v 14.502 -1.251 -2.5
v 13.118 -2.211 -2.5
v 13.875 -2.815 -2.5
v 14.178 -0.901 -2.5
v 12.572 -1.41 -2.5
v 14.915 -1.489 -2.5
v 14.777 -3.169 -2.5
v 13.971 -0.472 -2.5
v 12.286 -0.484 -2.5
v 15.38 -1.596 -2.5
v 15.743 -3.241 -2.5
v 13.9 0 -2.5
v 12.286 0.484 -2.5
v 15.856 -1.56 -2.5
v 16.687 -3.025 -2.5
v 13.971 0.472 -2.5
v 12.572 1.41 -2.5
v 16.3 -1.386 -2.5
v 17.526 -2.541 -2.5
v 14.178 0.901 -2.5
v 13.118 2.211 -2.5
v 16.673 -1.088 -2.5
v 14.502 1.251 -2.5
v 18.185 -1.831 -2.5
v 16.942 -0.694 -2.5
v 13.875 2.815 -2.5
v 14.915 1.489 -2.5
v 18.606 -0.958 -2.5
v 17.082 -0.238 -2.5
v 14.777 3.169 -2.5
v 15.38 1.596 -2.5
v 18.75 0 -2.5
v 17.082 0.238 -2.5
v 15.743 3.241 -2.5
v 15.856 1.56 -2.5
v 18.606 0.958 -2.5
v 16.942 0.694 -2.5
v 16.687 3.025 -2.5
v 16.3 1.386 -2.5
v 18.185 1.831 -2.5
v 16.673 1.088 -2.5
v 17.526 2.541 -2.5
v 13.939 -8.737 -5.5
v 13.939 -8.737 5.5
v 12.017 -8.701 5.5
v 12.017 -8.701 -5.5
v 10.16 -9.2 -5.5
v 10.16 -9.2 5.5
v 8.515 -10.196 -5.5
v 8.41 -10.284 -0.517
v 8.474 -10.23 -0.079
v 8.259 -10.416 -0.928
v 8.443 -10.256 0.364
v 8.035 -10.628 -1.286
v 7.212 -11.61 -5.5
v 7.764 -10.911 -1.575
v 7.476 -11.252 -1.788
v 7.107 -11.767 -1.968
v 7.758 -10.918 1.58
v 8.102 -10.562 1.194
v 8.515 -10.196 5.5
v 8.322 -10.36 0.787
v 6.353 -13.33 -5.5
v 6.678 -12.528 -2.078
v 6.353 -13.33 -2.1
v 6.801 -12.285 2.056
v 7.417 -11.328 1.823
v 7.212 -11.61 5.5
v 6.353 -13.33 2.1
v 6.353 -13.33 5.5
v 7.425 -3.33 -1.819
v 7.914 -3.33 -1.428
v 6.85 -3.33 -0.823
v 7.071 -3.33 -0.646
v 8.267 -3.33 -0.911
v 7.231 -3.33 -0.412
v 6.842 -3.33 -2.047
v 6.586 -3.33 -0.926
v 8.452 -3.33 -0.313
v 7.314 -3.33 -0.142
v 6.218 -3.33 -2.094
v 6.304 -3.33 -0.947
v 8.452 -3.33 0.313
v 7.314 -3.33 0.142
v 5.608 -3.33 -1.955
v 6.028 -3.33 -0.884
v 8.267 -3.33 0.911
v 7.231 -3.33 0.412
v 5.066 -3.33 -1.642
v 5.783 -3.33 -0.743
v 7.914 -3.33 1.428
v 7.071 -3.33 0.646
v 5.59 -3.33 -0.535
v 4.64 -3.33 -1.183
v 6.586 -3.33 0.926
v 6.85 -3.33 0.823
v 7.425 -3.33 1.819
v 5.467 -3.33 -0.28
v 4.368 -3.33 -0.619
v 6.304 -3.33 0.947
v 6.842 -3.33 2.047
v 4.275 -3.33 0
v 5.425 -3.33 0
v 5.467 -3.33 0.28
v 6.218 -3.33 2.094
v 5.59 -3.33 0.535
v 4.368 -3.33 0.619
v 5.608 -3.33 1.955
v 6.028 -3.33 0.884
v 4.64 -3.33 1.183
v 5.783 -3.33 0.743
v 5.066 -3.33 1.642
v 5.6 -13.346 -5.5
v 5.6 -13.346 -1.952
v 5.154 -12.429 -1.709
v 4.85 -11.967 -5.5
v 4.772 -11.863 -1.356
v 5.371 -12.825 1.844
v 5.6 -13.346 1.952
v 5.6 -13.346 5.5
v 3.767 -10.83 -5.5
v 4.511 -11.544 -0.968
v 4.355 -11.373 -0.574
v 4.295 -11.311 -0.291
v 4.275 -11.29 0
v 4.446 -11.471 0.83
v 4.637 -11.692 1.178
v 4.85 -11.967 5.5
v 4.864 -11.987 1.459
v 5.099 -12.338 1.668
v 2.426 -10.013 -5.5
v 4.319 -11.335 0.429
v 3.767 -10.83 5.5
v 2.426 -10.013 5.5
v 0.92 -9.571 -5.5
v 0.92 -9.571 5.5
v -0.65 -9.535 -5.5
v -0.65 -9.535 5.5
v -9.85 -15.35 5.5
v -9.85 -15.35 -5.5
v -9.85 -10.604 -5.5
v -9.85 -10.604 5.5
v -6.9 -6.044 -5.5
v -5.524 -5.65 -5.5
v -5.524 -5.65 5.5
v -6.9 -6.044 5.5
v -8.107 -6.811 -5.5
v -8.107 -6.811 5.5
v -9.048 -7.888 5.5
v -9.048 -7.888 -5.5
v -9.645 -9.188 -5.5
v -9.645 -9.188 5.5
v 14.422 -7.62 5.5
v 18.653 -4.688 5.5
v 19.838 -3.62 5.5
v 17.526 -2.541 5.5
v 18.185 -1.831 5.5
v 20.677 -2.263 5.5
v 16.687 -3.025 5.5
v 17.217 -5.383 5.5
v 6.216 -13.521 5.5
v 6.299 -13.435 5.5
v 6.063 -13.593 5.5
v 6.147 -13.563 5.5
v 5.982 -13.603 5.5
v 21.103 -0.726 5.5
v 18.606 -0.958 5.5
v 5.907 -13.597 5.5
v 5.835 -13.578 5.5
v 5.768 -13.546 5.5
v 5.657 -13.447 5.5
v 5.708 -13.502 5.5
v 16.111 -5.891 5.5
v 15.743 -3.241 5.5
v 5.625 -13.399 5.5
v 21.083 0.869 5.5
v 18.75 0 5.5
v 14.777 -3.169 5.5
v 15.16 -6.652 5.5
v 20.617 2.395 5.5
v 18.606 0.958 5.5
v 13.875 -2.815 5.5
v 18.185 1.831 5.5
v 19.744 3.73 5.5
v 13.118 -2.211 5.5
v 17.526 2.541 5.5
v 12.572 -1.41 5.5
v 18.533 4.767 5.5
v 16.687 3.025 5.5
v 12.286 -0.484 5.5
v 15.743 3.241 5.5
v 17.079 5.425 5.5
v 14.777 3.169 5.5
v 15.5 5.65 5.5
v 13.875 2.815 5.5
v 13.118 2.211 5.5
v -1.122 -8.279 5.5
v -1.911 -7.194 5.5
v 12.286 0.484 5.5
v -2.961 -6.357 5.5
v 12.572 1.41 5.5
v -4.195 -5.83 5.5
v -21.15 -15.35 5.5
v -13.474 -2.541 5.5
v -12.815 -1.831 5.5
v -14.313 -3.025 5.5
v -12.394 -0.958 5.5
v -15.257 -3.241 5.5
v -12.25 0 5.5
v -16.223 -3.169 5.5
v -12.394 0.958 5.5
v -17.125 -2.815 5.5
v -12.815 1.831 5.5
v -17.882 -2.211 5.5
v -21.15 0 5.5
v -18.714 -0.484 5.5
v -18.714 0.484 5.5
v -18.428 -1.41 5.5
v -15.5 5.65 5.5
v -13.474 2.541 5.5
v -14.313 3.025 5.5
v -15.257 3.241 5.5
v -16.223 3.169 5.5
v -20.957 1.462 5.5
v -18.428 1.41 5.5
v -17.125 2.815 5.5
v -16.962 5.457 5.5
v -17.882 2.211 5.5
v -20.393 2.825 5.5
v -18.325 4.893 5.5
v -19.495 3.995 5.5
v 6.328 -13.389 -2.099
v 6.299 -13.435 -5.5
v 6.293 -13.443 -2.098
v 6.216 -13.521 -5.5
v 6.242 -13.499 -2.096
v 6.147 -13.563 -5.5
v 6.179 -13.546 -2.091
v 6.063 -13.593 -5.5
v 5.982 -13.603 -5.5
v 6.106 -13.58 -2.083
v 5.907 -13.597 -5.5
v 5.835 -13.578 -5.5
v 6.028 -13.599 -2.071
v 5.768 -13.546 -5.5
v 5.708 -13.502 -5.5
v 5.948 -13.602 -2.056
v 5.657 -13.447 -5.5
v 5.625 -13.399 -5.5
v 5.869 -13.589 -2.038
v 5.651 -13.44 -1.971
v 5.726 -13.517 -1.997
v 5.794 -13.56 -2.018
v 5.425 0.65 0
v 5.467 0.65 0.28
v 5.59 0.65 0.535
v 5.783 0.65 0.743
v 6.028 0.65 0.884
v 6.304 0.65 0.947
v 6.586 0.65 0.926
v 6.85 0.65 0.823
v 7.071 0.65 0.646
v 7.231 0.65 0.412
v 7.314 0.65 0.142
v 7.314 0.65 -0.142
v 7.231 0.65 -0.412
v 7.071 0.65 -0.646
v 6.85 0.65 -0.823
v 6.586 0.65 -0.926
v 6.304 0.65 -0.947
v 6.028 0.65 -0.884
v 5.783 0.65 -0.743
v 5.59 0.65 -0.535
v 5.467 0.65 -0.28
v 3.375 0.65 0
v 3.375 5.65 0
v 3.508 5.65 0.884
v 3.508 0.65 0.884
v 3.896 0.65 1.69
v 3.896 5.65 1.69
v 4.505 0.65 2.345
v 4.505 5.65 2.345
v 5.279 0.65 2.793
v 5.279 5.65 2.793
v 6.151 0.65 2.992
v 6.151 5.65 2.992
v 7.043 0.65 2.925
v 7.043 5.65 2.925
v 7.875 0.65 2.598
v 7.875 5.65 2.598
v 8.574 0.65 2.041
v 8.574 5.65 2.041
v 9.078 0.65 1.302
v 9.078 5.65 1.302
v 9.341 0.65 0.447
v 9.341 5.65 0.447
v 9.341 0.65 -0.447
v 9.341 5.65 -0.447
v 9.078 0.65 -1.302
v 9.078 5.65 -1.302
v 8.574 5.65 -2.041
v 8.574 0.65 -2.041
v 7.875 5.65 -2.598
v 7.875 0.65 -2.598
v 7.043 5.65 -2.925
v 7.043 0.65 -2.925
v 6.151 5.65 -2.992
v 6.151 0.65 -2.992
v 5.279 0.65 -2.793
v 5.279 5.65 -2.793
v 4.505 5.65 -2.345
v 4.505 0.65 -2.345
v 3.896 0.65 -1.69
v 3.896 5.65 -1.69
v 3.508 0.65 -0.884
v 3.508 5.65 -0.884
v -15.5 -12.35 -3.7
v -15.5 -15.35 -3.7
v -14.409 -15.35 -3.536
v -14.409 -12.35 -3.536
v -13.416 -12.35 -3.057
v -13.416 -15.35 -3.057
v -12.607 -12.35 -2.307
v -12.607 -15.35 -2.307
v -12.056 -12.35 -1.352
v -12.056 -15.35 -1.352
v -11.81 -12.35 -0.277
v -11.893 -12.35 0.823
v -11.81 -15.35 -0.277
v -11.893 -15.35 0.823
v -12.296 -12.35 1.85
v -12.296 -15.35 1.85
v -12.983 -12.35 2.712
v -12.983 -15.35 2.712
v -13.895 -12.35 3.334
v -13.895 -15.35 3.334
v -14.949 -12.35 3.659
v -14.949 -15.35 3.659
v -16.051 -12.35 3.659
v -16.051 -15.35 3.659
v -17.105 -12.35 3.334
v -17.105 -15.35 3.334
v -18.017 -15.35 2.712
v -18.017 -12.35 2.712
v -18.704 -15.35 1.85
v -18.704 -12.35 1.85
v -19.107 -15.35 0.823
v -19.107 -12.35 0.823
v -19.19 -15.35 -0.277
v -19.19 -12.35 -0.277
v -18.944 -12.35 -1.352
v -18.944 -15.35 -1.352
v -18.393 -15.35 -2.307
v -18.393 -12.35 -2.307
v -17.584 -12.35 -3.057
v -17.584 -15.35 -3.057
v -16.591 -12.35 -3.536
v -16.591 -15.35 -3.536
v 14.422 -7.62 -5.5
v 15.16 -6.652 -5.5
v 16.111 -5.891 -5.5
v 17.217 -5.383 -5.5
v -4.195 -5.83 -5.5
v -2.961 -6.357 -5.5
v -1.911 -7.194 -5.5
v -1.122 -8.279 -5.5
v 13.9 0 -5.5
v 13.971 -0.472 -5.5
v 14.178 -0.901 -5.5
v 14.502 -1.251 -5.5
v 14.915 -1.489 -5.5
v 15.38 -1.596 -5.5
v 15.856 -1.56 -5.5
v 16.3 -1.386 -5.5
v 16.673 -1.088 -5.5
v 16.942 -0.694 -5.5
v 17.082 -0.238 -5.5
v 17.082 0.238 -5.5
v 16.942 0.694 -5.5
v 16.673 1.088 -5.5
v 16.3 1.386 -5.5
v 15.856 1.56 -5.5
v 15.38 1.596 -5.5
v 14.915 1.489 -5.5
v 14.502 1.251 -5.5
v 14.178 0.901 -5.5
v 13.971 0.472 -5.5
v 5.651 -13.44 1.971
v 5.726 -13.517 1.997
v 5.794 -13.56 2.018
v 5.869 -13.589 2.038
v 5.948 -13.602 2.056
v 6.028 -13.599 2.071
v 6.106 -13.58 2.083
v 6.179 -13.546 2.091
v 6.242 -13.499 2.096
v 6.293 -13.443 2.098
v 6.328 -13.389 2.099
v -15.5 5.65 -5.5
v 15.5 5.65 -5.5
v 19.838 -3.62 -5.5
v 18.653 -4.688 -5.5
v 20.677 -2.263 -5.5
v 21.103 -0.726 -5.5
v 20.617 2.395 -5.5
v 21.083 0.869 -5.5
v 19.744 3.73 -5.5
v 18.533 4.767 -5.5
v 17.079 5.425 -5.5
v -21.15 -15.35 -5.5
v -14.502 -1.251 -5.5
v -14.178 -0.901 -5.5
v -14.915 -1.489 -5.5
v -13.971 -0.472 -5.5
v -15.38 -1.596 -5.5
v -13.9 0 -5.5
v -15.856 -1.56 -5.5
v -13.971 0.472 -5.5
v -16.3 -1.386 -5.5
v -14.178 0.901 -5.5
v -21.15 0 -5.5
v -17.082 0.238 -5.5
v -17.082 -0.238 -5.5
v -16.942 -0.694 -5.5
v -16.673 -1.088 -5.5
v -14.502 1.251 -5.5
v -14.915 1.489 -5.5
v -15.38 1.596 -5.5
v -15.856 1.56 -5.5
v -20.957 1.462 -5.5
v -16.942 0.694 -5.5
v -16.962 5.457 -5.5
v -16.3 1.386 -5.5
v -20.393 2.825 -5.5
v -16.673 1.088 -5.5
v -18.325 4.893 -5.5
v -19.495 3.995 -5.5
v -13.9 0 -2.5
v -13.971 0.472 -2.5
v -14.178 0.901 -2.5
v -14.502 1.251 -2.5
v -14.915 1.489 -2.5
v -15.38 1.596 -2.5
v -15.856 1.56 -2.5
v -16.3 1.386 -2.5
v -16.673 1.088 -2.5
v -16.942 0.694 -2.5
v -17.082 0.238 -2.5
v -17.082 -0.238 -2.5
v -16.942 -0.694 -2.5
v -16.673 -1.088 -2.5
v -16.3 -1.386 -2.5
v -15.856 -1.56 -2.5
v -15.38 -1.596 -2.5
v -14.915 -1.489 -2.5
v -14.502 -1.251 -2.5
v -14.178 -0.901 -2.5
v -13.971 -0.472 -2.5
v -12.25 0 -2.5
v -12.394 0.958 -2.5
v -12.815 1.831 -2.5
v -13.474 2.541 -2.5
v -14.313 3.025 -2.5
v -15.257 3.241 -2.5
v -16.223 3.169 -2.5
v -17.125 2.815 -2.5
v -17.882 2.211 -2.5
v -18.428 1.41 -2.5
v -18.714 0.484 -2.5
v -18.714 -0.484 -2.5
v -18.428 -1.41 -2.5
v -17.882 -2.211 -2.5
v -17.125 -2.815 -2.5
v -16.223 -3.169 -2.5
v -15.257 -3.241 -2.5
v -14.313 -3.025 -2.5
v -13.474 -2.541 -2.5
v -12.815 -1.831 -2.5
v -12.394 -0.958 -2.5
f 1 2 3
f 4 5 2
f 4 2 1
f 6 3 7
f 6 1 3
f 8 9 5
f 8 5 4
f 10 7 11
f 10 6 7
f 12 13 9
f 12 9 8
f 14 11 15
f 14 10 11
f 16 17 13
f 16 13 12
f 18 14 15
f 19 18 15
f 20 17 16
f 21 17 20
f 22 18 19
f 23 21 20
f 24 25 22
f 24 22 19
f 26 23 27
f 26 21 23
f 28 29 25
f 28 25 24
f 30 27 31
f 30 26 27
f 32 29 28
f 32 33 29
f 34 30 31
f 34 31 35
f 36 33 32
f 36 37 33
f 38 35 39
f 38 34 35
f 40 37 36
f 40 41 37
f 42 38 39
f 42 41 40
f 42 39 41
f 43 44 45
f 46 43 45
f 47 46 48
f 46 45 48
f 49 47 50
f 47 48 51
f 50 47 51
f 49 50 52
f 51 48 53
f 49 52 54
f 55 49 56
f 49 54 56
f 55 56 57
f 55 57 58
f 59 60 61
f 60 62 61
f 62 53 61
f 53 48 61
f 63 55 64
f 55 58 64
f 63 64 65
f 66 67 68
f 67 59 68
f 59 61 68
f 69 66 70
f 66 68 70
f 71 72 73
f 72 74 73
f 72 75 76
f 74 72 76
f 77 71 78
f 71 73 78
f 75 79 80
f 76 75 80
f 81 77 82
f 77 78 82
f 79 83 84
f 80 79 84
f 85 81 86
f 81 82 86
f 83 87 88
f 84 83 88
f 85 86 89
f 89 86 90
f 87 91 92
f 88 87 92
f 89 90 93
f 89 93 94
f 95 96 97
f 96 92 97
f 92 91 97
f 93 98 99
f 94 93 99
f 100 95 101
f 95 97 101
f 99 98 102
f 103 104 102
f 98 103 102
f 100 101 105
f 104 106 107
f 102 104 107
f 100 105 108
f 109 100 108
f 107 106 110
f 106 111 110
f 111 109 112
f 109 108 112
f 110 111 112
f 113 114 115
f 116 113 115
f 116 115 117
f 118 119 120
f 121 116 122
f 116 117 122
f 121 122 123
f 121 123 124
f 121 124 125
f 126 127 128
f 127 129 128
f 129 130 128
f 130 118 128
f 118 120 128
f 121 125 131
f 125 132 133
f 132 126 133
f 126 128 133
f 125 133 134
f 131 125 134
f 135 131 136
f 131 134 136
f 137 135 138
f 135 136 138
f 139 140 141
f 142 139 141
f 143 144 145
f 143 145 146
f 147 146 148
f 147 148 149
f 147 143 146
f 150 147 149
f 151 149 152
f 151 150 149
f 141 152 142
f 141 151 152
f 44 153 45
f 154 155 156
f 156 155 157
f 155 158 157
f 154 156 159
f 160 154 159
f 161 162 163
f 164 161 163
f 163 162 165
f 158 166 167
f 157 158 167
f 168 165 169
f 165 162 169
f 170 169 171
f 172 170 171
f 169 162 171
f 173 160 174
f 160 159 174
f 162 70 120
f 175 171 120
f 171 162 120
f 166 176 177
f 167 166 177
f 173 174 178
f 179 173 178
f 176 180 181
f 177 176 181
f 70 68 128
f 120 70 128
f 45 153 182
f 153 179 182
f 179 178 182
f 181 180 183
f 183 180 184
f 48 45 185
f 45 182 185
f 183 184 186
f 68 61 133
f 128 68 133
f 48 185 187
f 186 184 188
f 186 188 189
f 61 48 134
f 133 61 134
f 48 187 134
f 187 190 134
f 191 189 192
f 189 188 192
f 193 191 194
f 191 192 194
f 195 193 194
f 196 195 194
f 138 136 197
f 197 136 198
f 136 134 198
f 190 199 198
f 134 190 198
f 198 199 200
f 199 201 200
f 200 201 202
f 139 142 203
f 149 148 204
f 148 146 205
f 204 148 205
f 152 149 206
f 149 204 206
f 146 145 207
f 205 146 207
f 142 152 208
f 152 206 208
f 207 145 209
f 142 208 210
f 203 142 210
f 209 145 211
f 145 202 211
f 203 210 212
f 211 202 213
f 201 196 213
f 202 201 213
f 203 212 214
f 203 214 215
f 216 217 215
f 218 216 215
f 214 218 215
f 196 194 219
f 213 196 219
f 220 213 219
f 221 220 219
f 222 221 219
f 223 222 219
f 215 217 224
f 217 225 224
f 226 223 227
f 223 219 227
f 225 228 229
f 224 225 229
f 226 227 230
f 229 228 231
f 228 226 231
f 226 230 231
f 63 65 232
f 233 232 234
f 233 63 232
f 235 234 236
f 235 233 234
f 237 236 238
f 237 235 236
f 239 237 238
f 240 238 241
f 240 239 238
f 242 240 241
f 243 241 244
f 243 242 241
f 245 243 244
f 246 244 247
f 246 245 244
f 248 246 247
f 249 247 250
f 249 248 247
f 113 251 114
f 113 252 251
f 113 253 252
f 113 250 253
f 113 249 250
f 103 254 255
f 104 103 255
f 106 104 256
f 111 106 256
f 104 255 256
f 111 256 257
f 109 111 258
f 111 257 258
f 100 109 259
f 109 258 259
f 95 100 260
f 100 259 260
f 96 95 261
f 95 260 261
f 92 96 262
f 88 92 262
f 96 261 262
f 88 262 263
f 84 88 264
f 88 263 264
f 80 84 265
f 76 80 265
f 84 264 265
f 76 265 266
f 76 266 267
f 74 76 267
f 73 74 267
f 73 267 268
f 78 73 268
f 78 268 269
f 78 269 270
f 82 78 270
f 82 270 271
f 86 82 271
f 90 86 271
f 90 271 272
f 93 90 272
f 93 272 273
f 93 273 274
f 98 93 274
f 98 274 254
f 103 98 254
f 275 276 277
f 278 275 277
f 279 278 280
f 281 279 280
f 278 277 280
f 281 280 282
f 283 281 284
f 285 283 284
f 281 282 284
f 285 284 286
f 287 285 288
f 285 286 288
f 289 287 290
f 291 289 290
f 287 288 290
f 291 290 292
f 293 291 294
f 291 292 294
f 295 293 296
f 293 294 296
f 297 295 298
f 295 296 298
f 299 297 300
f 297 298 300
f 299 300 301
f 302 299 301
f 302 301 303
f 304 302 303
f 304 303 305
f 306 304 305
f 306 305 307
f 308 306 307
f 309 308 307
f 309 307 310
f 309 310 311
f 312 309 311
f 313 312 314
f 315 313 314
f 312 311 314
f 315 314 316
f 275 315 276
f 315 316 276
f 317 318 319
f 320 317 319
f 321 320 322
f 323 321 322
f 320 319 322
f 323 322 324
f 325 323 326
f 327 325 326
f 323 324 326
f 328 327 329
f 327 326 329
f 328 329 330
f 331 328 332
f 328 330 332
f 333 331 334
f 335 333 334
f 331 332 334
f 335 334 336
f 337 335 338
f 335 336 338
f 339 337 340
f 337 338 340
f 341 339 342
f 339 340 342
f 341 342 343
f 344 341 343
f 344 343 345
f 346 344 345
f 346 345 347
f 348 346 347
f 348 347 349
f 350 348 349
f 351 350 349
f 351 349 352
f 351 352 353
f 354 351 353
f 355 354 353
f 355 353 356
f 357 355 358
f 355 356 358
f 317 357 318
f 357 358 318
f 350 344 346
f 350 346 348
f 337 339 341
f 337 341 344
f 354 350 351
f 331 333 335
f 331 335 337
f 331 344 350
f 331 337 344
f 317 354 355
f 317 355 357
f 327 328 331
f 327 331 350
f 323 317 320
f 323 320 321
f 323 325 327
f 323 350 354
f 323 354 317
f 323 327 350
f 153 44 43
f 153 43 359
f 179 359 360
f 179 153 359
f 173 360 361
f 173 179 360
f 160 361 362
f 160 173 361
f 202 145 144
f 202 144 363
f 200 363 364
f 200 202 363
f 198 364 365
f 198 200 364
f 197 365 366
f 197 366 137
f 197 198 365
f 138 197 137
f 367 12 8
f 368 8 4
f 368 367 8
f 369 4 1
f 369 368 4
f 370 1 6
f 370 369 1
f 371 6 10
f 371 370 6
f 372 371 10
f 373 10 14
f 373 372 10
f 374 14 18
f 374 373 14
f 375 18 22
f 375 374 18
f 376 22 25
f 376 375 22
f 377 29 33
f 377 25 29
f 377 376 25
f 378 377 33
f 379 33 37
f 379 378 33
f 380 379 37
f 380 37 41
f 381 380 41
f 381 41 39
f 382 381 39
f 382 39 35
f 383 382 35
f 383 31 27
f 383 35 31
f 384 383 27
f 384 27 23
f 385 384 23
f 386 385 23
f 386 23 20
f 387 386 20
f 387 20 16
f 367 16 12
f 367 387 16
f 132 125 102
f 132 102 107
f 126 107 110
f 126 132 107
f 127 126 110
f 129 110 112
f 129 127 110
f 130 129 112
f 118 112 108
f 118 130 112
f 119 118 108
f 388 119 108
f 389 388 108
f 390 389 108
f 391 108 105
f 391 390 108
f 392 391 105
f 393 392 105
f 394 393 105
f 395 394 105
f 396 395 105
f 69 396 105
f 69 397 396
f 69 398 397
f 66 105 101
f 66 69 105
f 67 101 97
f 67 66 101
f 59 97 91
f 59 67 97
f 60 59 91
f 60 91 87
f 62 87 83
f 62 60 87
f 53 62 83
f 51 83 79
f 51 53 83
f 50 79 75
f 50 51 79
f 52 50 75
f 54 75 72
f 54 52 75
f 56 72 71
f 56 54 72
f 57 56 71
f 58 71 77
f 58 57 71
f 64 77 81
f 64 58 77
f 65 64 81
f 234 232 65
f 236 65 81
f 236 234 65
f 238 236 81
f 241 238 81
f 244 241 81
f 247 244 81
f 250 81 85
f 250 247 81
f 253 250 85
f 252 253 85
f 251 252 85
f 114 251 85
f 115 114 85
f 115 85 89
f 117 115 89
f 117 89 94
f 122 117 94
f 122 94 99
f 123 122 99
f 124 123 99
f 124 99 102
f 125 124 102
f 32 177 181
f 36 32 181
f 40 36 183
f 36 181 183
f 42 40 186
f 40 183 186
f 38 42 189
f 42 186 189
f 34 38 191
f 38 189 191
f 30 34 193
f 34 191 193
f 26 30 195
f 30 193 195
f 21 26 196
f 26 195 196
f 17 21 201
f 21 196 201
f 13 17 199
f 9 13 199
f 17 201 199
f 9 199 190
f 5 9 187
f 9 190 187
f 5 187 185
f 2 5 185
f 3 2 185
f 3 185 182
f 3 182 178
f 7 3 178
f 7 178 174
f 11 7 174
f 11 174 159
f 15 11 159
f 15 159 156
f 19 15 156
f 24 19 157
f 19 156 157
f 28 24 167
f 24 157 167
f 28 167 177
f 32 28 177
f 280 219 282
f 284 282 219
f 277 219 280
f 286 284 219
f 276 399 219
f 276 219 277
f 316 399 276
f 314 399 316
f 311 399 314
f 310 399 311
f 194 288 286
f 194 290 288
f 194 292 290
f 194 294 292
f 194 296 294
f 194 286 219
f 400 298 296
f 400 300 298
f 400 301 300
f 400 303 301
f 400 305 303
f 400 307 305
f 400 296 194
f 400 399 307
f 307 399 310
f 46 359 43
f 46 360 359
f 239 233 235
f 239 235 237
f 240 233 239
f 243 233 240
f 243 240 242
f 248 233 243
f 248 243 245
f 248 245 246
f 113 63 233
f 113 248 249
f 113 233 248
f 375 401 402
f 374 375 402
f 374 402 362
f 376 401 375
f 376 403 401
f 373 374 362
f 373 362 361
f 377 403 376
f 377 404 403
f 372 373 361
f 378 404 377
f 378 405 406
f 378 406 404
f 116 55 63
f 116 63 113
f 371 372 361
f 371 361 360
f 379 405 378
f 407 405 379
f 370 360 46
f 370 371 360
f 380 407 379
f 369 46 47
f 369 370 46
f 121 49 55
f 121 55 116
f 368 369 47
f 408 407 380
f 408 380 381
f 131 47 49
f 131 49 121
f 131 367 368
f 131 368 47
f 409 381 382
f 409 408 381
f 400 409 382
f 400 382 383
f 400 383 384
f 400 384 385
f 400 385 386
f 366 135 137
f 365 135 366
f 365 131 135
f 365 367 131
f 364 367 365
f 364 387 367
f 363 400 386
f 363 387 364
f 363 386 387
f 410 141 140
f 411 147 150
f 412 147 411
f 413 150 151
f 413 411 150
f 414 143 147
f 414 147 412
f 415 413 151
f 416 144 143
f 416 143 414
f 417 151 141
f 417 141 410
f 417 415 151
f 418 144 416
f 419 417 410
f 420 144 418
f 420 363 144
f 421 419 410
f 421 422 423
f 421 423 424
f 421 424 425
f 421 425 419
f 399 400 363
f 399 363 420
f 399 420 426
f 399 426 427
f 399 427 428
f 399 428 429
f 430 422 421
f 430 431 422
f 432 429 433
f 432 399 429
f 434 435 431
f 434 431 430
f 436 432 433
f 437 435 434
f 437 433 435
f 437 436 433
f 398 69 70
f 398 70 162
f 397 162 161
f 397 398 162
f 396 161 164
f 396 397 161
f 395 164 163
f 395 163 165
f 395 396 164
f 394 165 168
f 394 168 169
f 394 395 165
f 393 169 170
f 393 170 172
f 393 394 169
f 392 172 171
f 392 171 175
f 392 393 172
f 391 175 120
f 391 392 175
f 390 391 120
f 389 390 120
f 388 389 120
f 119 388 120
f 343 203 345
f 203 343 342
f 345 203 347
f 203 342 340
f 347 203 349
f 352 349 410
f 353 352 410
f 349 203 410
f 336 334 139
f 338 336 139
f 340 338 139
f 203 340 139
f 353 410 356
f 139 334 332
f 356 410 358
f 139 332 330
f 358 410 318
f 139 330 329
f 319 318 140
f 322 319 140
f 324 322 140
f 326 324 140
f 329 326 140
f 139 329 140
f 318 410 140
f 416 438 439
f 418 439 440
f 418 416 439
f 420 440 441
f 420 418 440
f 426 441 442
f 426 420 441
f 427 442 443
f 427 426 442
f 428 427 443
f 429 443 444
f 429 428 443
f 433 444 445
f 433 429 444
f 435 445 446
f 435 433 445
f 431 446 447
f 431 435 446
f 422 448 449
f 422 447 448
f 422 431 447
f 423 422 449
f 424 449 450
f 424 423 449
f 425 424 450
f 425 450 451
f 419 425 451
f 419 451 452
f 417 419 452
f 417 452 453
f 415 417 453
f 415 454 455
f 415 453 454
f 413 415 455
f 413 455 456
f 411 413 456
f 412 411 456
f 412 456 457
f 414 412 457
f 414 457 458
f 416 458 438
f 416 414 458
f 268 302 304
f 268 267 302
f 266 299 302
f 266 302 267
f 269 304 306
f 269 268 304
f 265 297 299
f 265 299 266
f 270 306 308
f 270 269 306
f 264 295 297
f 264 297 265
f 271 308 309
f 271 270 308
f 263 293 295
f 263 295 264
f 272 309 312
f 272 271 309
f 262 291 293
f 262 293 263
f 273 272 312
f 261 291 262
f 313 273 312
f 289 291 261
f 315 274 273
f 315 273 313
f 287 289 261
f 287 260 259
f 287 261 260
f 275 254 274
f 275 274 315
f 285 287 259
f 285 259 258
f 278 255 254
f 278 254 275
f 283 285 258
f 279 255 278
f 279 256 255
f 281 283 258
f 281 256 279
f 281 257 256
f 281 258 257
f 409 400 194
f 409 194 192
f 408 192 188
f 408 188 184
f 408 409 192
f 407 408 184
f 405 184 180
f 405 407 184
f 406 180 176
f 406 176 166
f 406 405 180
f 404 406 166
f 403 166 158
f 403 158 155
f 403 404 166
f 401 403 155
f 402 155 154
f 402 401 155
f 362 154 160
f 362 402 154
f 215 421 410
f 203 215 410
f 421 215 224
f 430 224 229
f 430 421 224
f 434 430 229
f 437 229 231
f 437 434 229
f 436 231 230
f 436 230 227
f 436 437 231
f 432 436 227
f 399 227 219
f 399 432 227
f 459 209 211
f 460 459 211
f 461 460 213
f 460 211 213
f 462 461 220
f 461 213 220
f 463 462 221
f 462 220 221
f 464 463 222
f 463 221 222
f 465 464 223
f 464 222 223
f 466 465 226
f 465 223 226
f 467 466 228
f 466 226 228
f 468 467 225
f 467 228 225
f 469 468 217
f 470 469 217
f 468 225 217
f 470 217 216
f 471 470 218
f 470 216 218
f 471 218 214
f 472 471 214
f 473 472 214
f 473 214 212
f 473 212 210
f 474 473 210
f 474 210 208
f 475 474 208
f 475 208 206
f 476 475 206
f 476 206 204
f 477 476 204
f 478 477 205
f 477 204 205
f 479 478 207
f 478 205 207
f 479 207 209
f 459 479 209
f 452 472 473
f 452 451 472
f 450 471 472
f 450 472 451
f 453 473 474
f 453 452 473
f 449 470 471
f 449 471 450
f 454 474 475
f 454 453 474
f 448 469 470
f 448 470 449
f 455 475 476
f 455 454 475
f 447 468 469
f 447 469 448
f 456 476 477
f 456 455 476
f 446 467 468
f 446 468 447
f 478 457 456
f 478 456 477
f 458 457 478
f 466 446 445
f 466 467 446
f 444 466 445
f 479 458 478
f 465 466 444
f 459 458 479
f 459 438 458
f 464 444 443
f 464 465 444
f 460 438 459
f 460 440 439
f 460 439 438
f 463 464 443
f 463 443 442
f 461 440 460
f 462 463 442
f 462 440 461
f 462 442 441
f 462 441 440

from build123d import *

# Parameters (mm, degrees)
BOSS_EXTRUDE1_DEPTH      = 5.5
BOSS_EXTRUDE1_DEPTH_BACK = 5.5
SKETCH1_R                = 1.6
SKETCH4_R                = 3
CUT_EXTRUDE2_DEPTH       = 5
BOSS_EXTRUDE2_DEPTH      = 11
FILLET1_R                = 0.4
SKETCH7_R                = 0.95
CUT_EXTRUDE3_DEPTH       = 30.124654232
CUT_EXTRUDE5_DEPTH       = 10
CUT_EXTRUDE5_DEPTH_BACK  = 30.124654236
CUT_EXTRUDE5_START       = -18.97961
SKETCH8_R                = 2.1
FILLET2_R                = 5
SKETCH9_R                = 3.25
CUT_EXTRUDE6_DEPTH       = 8
BOSS_EXTRUDE3_START      = -11
SKETCH10_W               = 5.65
SKETCH10_H               = 9.7
BOSS_EXTRUDE3_DEPTH      = 11
SKETCH11_R               = 3.7
CUT_EXTRUDE7_DEPTH       = 3
FILLET3_R                = 5


with BuildPart() as part:
    # Sketch1 → Boss-Extrude1 (new, two sides: drawn at the far end of the back side and taken through both)
    with BuildSketch(Plane.XY.offset(-BOSS_EXTRUDE1_DEPTH_BACK)):
        with BuildLine():
            Line((-15.5, 5.65), (15.5, 5.65))
            ThreePointArc((15.5, 5.65), (21.15, 0), (15.5, -5.65))
            Line((15.5, -5.65), (-15.5, -5.65))
            ThreePointArc((-15.5, -5.65), (-21.15, 0), (-15.5, 5.65))
        make_face()
        with Locations((-15.5, 0)):
            Circle(SKETCH1_R, mode=Mode.SUBTRACT)
        with Locations(Location((15.5, 0, 0), (0, 0, 180))):
            Circle(SKETCH1_R, mode=Mode.SUBTRACT)
    extrude(amount=BOSS_EXTRUDE1_DEPTH + BOSS_EXTRUDE1_DEPTH_BACK)

    # Sketch4 → Cut-Extrude2 (cut)
    with BuildSketch(Plane(origin=(0, 5.65, 0), x_dir=(1, 0, 0), z_dir=(0, 1, 0))):
        with Locations(Location((6.375, 0, 0), (0, 0, 180))):
            Circle(SKETCH4_R)
    extrude(amount=-CUT_EXTRUDE2_DEPTH, mode=Mode.SUBTRACT)

    # Sketch6 → Boss-Extrude2 (add)
    with BuildSketch(Plane.XY.offset(5.5)):
        with BuildLine():
            Line((-0.65013639, -9.535327111), (-0.65013639, -5.65))
            Line((-0.65013639, -5.65), (13.939015195, -5.65))
            Line((13.939015195, -5.65), (13.939015195, -8.737119999))
            ThreePointArc((13.939015195, -8.737119999), (8.407998992, -10.285488801), (6, -15.5))
            ThreePointArc((6, -15.5), (4.006194058, -11.03341191), (-0.65013639, -9.535327111))
        make_face()
    extrude(amount=-BOSS_EXTRUDE2_DEPTH)

    # Fillet1
    fillet1_edges = [part.edges().sort_by_distance(p)[0] for p in [
        (6, -15.5, 0),
    ]]
    fillet(fillet1_edges, radius=FILLET1_R)

    # Sketch7 → Cut-Extrude3 (cut, through all)
    with BuildSketch(Plane(origin=(0, 5.65, 0), x_dir=(1, 0, 0), z_dir=(0, 1, 0))):
        with Locations(Location((6.375, 0, 0), (0, 0, 180))):
            Circle(SKETCH7_R)
    extrude(amount=-CUT_EXTRUDE3_DEPTH, mode=Mode.SUBTRACT)

    # Sketch8 → Cut-Extrude5 (cut, two sides: drawn at the far end of the back side and taken through both)
    with BuildSketch(Plane(origin=(0, 5.65, 0), x_dir=(1, 0, 0), z_dir=(0, 1, 0)).offset(CUT_EXTRUDE5_START - CUT_EXTRUDE5_DEPTH_BACK)):
        with Locations(Location((6.375, 0, 0), (0, 0, 180))):
            Circle(SKETCH8_R)
    extrude(amount=CUT_EXTRUDE5_DEPTH + CUT_EXTRUDE5_DEPTH_BACK, mode=Mode.SUBTRACT)

    # Fillet2
    # the kernel refuses this fillet: 5 mm, written as the material it adds along each edge
    with BuildSketch(Plane(origin=(13.939015195, -5.65, 5.5), x_dir=(0, -1, 0), z_dir=(0, 0, -1))) as fillet2_piece_1:
        with BuildLine():
            CenterArc((4.496369398, -4.797292583), FILLET2_R, 106.370642389, 55.938643206)
            Line((-0.26718431, -3.27789926), (-0.743539681, -3.125959928))
            ThreePointArc((-0.743539681, -3.125959928), (-0.5, -1.560984805), (-0.5, 0))
            Line((-0.5, 0), (0, 0.5))
            ThreePointArc((0, 0.5), (1.54356, 0.5), (2.946195059, 0.479729258))
            Line((2.946195059, 0.479729258), (3.087119999, 0))
        make_face()
    extrude(amount=11)
    with BuildSketch(Plane(origin=(-0.65013639, -5.65, 5.5), x_dir=(0, -1, 0), z_dir=(0, 0, -1))) as fillet2_piece_2:
        with BuildLine():
            CenterArc((5, 4.874167042), FILLET2_R, 180, 77.118546425)
            Line((0, 4.874167042), (-0.1, 4.874167042))
            Line((-0.1, 4.874167042), (-0.1, 0))
            Line((-0.1, 0), (0, -0.1))
            ThreePointArc((0, -0.1), (1.942663555, -0.1), (3.863033653, -0.097483341))
            Line((3.863033653, -0.097483341), (3.885327111, 0))
        make_face()
    extrude(amount=11)

    # Sketch9 → Cut-Extrude6 (cut)
    with BuildSketch(Plane.XY.offset(5.5)):
        with Locations((-15.5, 0)):
            Circle(SKETCH9_R)
        with Locations((15.5, 0)):
            Circle(SKETCH9_R)
    extrude(amount=-CUT_EXTRUDE6_DEPTH, mode=Mode.SUBTRACT)

    # Sketch10 → Boss-Extrude3 (add)
    with BuildSketch(Plane.XY.offset(5.5).offset(BOSS_EXTRUDE3_START)):
        with Locations((-12.675, -10.5)):
            Rectangle(SKETCH10_W, SKETCH10_H)
        with BuildLine():
            Line((-15.5, -15.35), (-15.5, -5.65))
            ThreePointArc((-15.5, -5.65), (-19.495153314, -3.995153314), (-21.15, 0))
            Line((-21.15, 0), (-21.15, -15.35))
            Line((-21.15, -15.35), (-15.5, -15.35))
        make_face()
    extrude(amount=BOSS_EXTRUDE3_DEPTH)

    # Sketch11 → Cut-Extrude7 (cut)
    with BuildSketch(Plane.XZ.offset(15.35)):
        with Locations(Location((-15.5, 0, 0), (0, 0, 270))):
            Circle(SKETCH11_R)
    extrude(amount=-CUT_EXTRUDE7_DEPTH, mode=Mode.SUBTRACT)

    # Fillet3
    # the kernel refuses this fillet: 5 mm, written as the material it adds along each edge
    with BuildSketch(Plane(origin=(-9.85, -5.65, -5.5), x_dir=(1, 0, 0), z_dir=(0, 0, 1))) as fillet3_piece_1:
        with BuildLine():
            CenterArc((5, -4.954322848), FILLET3_R, 97.75056413, 82.24943587)
            Line((0, -4.954322848), (-0.1, -4.954322848))
            Line((-0.1, -4.954322848), (-0.1, 0))
            Line((-0.1, 0), (0, 0.1))
            ThreePointArc((0, 0.1), (2.162848284, 0.1), (4.3122105, 0.099086457))
            Line((4.3122105, 0.099086457), (4.325696569, 0))
        make_face()
    extrude(amount=11)


solid = part.part
